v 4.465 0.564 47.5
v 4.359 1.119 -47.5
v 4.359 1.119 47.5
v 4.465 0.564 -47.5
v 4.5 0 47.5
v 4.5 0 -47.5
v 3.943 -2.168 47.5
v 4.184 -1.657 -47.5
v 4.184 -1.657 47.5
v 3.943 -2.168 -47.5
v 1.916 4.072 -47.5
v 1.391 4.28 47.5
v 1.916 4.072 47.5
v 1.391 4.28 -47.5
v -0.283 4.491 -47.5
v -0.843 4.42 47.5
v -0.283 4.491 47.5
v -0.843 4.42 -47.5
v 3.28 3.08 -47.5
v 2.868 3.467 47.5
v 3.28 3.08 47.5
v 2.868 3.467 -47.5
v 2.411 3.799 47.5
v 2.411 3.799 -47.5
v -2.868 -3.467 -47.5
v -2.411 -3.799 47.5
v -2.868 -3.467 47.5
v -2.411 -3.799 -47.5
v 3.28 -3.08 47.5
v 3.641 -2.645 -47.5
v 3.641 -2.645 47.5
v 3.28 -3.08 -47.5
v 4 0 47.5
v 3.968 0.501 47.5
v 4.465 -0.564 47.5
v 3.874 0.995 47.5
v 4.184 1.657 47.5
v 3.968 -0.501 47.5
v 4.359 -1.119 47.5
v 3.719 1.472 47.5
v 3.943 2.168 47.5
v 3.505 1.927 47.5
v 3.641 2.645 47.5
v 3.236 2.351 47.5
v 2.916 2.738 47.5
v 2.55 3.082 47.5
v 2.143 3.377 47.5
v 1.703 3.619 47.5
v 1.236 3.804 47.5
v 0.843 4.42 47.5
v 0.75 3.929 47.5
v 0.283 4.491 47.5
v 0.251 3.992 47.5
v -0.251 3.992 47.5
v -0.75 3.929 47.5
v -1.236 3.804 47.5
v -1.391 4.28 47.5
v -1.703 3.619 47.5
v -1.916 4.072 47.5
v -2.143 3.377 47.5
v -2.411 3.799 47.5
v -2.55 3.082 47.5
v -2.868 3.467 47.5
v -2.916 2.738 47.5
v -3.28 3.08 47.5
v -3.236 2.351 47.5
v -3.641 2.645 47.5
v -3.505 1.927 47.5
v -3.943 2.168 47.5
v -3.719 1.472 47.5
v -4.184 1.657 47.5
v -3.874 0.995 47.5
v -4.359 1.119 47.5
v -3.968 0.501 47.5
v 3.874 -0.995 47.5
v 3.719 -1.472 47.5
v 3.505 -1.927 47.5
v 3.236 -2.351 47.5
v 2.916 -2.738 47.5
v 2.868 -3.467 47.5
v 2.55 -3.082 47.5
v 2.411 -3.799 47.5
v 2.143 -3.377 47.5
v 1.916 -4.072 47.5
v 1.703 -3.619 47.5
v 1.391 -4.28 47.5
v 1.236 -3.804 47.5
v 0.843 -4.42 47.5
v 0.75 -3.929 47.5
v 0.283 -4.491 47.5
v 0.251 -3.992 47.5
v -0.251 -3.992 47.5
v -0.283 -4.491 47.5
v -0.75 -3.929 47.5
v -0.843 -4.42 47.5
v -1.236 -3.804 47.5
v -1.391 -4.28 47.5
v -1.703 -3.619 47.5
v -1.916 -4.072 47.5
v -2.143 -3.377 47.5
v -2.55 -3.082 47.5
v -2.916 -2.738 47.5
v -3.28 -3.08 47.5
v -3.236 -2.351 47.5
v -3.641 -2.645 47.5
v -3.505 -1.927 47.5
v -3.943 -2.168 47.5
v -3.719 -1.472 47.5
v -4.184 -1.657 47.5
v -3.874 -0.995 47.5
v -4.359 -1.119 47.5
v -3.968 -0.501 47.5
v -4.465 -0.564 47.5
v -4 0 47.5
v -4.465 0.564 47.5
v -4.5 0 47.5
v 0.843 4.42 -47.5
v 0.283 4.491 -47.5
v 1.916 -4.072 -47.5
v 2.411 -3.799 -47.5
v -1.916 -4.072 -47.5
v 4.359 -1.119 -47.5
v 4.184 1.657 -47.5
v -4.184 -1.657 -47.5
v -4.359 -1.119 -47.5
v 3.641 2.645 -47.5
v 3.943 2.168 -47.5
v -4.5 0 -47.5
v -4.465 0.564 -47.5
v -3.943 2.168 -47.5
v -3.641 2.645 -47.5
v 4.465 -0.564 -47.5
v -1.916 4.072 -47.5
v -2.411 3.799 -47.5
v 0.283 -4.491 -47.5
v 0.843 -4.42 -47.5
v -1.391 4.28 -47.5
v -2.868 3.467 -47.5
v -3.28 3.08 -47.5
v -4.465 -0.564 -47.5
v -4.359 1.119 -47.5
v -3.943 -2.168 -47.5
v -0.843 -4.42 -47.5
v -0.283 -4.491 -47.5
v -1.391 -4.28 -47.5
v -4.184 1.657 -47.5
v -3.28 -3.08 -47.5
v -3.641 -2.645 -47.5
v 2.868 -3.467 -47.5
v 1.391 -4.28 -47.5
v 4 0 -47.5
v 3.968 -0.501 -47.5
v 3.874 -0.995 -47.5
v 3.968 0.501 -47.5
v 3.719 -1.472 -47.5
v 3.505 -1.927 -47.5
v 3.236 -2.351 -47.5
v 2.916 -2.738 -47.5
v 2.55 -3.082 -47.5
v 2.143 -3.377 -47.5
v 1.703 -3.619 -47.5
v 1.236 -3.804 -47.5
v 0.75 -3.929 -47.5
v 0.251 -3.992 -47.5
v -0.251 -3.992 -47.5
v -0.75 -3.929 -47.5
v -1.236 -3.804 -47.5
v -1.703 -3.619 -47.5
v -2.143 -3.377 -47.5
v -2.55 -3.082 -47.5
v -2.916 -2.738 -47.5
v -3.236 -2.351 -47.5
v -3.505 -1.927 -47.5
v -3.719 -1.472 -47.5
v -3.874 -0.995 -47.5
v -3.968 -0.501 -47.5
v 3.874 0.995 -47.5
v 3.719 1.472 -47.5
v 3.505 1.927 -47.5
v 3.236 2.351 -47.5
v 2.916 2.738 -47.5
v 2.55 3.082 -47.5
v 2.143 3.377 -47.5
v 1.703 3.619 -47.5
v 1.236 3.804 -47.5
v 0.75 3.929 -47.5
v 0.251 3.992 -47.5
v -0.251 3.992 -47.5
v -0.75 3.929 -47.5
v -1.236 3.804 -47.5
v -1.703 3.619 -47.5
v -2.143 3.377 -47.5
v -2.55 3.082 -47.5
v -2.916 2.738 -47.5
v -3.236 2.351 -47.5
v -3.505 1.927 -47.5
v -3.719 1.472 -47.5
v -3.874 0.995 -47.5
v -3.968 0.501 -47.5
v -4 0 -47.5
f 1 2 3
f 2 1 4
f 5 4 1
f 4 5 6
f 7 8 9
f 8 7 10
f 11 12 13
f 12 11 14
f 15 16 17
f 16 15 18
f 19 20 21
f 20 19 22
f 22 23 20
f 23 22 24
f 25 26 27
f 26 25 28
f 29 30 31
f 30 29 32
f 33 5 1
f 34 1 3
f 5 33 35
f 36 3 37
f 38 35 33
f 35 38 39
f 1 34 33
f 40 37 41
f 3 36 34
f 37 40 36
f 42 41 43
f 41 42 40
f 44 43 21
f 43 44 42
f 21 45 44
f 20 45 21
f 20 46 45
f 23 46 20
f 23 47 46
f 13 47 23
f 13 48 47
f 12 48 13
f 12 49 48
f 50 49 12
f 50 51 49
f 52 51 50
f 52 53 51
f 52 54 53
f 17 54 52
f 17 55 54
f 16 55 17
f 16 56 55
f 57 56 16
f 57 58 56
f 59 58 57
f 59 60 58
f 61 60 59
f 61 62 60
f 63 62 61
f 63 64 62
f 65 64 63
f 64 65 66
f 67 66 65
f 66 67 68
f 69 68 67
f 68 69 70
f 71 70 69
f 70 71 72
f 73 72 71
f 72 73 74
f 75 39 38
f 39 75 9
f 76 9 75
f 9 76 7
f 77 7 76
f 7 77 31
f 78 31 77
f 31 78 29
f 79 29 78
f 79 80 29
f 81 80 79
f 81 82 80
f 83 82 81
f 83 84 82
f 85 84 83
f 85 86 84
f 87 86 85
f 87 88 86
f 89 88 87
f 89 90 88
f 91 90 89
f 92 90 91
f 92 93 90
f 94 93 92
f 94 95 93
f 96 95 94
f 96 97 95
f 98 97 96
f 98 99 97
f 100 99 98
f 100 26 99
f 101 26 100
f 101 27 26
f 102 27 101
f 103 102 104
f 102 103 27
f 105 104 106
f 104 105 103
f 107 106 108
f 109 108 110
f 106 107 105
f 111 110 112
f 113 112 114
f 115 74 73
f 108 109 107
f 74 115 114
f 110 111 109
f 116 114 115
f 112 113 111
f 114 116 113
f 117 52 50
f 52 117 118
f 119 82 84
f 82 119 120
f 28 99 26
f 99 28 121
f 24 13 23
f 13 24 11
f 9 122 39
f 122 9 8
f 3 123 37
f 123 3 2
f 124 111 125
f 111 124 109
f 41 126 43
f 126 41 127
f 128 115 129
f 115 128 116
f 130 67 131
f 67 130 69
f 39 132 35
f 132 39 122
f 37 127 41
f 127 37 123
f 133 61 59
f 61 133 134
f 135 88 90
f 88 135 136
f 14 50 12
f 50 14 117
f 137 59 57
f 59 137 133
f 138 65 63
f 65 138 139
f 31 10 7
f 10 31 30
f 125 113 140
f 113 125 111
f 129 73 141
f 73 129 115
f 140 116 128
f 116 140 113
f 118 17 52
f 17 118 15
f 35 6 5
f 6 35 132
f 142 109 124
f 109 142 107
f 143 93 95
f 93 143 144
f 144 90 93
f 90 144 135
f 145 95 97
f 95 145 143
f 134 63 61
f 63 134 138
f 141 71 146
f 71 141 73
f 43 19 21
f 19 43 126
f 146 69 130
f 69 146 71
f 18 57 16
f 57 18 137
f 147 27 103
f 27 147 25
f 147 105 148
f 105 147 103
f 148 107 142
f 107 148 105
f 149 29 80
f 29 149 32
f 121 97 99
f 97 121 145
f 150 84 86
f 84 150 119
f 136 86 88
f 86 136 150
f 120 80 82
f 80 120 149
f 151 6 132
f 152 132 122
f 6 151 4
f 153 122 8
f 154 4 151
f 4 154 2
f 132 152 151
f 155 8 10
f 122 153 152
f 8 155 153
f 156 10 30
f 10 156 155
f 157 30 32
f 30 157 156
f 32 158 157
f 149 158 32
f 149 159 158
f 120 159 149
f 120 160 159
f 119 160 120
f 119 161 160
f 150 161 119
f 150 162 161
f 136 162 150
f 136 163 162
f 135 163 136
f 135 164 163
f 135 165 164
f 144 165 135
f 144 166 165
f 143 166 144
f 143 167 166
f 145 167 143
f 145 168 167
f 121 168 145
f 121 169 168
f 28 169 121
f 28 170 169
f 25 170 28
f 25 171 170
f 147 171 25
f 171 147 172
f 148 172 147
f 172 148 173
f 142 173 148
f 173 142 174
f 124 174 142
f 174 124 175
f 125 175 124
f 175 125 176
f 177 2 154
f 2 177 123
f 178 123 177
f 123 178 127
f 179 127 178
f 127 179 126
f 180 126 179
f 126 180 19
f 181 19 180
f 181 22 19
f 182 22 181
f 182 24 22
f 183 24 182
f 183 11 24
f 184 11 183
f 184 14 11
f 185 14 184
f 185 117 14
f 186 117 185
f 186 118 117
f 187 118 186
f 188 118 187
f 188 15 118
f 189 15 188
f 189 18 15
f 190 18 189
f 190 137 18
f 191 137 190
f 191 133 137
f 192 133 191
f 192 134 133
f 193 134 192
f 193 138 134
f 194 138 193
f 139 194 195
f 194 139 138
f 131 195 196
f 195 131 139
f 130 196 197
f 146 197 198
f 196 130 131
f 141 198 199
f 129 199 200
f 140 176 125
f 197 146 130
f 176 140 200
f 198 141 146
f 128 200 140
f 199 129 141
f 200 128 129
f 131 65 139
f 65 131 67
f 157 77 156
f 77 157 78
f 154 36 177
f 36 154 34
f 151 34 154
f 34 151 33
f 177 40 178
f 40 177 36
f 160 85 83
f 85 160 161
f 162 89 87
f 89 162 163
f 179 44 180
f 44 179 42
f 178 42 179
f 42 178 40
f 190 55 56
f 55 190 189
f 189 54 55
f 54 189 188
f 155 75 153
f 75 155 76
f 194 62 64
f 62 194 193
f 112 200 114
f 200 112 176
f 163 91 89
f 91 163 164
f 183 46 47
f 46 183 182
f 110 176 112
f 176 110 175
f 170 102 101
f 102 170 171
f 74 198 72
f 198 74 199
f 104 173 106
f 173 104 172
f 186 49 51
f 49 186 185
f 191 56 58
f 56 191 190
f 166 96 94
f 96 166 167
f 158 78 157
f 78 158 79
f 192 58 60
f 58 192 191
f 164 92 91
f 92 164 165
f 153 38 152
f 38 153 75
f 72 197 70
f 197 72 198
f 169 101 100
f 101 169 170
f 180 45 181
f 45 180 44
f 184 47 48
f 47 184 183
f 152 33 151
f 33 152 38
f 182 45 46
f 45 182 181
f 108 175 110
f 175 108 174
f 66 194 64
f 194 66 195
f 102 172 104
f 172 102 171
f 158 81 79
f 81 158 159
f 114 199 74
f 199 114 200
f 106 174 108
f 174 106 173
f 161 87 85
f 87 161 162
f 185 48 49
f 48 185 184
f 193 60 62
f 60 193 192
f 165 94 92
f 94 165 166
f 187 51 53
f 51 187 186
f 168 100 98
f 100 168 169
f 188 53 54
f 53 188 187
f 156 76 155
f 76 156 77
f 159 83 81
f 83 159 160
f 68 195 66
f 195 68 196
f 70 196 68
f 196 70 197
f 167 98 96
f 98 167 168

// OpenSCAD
$fn = 50;


difference() {
	union() {
		translate(v = [0, 0, -47.5000000000]) {
			cylinder(h = 95, r = 4.5000000000);
		}
	}
	union() {
		translate(v = [0, 0, -100.0000000000]) {
			cylinder(h = 200, r = 4.0000000000);
		}
	}
}
